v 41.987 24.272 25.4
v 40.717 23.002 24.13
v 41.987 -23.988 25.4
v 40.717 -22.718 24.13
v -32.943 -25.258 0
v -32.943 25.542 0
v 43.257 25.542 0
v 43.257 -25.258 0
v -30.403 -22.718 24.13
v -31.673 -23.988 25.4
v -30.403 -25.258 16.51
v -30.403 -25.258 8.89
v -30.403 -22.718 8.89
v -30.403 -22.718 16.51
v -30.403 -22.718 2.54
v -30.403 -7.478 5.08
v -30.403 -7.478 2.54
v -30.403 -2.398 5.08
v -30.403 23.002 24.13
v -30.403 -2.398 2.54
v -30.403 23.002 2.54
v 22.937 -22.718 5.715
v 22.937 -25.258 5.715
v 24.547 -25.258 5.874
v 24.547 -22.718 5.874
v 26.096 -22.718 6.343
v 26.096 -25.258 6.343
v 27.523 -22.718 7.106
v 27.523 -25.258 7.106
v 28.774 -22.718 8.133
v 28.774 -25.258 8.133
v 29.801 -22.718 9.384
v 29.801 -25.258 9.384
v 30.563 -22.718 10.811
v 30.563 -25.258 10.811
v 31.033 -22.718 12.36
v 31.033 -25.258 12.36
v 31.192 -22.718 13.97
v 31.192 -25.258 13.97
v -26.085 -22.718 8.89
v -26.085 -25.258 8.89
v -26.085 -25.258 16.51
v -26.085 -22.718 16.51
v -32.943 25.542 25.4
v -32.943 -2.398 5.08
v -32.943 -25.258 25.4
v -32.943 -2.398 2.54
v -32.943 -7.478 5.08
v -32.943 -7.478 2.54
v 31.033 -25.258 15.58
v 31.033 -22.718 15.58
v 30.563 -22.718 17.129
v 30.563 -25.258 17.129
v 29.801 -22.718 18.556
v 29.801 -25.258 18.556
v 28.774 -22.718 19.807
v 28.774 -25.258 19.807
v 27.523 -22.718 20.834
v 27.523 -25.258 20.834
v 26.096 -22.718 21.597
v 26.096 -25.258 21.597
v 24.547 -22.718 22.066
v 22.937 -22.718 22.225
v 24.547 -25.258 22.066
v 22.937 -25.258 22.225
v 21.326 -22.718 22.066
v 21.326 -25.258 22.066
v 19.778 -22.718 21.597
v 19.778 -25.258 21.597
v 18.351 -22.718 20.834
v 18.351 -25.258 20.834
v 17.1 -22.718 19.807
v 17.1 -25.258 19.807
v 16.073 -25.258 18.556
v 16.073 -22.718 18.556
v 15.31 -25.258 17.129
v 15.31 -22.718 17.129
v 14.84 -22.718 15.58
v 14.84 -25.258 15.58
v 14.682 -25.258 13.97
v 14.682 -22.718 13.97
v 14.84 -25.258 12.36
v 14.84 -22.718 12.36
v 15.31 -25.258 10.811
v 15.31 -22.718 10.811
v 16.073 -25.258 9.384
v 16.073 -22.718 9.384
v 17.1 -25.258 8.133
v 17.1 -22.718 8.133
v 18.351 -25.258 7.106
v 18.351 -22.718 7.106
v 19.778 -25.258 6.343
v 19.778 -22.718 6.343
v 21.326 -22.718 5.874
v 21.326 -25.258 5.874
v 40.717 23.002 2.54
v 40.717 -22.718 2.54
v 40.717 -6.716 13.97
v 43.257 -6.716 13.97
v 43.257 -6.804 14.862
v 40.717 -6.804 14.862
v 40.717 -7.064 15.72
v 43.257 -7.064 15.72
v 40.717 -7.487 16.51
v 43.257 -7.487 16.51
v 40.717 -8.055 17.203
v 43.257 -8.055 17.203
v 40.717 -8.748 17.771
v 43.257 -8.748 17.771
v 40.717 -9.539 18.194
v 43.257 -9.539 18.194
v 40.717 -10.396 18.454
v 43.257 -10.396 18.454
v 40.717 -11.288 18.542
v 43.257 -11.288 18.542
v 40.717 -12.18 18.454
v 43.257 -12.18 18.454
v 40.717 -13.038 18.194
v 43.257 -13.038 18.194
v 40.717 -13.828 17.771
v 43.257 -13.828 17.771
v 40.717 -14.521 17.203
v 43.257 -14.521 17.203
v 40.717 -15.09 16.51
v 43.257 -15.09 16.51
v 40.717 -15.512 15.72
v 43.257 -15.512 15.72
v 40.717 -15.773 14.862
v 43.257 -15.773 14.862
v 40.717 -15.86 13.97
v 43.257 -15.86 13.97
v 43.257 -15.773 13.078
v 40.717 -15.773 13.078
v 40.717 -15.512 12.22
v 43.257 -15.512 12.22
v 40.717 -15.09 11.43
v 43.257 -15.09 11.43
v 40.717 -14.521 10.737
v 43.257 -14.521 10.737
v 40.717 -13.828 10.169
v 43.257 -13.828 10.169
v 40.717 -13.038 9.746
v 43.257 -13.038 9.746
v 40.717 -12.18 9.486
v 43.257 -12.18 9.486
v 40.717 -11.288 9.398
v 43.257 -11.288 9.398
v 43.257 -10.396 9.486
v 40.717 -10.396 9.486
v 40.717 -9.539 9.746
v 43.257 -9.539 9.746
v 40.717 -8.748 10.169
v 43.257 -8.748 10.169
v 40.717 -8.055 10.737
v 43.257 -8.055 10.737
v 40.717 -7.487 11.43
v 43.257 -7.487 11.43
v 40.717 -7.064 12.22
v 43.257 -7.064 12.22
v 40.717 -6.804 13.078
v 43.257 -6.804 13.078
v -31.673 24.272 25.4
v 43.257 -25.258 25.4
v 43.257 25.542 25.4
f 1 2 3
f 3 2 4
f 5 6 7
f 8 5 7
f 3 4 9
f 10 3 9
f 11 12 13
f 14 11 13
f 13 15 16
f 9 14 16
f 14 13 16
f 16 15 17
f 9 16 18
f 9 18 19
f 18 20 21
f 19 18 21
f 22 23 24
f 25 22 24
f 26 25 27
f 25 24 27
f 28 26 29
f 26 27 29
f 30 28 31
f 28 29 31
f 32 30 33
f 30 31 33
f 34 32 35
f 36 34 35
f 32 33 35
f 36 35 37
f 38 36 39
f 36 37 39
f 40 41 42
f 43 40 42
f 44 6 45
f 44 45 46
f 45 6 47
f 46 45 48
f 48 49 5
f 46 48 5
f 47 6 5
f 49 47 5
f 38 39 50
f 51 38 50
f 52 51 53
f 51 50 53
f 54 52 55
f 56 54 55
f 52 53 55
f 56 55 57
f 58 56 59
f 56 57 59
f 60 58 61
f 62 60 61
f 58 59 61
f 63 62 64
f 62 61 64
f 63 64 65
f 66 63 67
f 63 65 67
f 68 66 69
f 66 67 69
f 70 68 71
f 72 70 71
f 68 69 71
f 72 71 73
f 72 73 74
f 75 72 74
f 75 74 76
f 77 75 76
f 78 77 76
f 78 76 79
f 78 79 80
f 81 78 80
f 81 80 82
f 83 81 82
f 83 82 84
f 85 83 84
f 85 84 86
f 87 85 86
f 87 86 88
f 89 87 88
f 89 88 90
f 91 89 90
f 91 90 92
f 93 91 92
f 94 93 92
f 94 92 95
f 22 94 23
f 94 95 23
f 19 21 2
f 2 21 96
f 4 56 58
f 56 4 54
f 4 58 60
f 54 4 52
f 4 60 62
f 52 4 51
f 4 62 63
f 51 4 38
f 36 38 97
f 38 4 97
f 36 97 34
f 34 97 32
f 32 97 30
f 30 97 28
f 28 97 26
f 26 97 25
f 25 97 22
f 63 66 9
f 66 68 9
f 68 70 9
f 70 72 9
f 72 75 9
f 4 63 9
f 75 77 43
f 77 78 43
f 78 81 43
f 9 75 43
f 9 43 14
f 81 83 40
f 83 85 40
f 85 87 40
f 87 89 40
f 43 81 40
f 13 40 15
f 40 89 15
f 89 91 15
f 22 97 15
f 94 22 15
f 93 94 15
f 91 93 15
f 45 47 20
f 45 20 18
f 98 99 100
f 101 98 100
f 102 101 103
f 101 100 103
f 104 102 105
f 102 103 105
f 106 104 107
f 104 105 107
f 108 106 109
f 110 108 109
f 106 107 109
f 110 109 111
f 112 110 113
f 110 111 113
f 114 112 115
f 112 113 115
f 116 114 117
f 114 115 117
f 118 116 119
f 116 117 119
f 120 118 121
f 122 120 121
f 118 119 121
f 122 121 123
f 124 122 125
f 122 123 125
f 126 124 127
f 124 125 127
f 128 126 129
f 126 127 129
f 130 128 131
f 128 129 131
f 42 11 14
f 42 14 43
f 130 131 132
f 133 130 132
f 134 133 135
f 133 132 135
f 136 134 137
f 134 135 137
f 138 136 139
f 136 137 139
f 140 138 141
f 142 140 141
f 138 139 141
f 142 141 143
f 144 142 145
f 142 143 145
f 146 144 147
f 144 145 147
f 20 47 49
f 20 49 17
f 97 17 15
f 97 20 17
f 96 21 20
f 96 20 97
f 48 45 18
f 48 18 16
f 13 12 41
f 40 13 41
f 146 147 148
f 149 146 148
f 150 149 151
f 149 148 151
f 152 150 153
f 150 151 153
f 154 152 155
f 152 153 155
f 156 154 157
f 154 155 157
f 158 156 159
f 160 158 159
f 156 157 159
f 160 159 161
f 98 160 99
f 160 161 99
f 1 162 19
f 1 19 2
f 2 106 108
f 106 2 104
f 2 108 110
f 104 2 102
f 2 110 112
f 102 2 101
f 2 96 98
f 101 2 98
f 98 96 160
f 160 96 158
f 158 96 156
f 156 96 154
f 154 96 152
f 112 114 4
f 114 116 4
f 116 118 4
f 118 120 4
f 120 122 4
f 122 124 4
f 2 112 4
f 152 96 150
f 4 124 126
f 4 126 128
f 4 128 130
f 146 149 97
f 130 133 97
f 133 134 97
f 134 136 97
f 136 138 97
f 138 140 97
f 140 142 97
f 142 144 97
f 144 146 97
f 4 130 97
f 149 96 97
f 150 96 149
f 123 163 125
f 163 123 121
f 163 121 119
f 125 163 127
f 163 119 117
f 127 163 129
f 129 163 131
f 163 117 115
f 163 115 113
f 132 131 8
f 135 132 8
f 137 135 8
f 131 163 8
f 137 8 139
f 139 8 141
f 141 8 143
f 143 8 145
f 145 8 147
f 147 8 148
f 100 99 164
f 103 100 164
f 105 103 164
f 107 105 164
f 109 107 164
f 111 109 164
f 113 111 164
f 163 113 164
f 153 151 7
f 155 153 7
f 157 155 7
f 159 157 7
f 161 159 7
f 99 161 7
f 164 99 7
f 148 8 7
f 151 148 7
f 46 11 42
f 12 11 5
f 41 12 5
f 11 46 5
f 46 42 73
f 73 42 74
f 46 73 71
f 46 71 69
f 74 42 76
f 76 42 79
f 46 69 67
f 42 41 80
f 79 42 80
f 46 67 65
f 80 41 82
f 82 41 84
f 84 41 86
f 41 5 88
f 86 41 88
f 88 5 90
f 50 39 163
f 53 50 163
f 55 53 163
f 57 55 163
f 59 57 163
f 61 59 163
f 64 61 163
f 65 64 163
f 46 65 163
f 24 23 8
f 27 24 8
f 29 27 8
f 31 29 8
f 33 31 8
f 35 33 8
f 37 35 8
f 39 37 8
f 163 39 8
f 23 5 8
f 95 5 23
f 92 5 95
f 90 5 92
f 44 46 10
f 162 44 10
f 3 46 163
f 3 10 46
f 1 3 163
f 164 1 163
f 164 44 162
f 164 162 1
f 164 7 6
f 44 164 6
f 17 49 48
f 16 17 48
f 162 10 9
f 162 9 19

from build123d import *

# Parameters (mm, degrees)
F0_W      = 76.2
F0_H      = 50.8
F1_DEPTH  = 2.54
F3_DEPTH  = 22.86
F5_DEPTH  = 25.4
F7_DEPTH  = 25.4
F8_W      = 4.318
F8_H      = 7.62
F9_DEPTH  = 25.4
F10_W     = 5.08
F10_H     = 2.54
F11_DEPTH = 25.4
F12_SIZE  = 1.27


with BuildPart() as f1:
    # F0 (on Top) → F1 (new body)
    with BuildSketch(Plane.XY):
        with Locations((5.156827, 0.141645)):
            Rectangle(F0_W, F0_H)
    extrude(amount=F1_DEPTH)

    # F2 (on face) → F3 (join)
    with BuildSketch(Plane.XY.offset(2.54)):
        Polygon((-30.403173, -22.718355), (-30.403173, 23.001645), (40.716827, 23.001645), (40.716827, -5.898658), (43.256827, -5.898658), (43.256827, 25.541645), (-32.943173, 25.541645), (-32.943173, -25.258355), (19.057203, -25.258355), (19.057203, -22.718355), align=None)
        Polygon((43.256827, -5.898658), (40.716827, -5.898658), (40.716827, -22.718355), (19.057203, -22.718355), (19.057203, -25.258355), (43.256827, -25.258355), align=None)
    extrude(amount=F3_DEPTH)

    # F4 (on face) → F5 (cut)
    with BuildSketch(Plane.XZ.offset(25.258355)):
        with BuildLine():
            Line((22.936827, 13.97), (31.191827, 13.97))
            ThreePointArc((31.191827, 13.97), (17.09966, 19.807166), (22.936827, 5.715))
            Line((22.936827, 5.715), (22.936827, 13.97))
        make_face()
        with BuildLine():
            ThreePointArc((22.936827, 5.715), (28.773993, 8.132834), (31.191827, 13.97))
            Line((31.191827, 13.97), (22.936827, 13.97))
            Line((22.936827, 13.97), (22.936827, 5.715))
        make_face()
    extrude(amount=-F5_DEPTH, mode=Mode.SUBTRACT)

    # F6 (on face) → F7 (cut)
    with BuildSketch(Plane.YZ.offset(43.256827)):
        with BuildLine():
            ThreePointArc((-11.288355, 9.398), (-8.055463, 10.737108), (-6.716355, 13.97))
            ThreePointArc((-6.716355, 13.97), (-11.288355, 18.542), (-15.860355, 13.97))
            Line((-15.860355, 13.97), (-11.288355, 13.97))
            Line((-11.288355, 13.97), (-11.288355, 9.398))
        make_face()
        with BuildLine():
            Line((-11.288355, 13.97), (-15.860355, 13.97))
            ThreePointArc((-15.860355, 13.97), (-14.521247, 10.737108), (-11.288355, 9.398))
            Line((-11.288355, 9.398), (-11.288355, 13.97))
        make_face()
    extrude(amount=-F7_DEPTH, mode=Mode.SUBTRACT)

    # F8 (on face) → F9 (cut)
    with BuildSketch(Plane.XZ.offset(25.258355)):
        with Locations((-28.244173, 12.7)):
            Rectangle(F8_W, F8_H)
    extrude(amount=-F9_DEPTH, mode=Mode.SUBTRACT)

    # F10 (on face) → F11 (cut)
    with BuildSketch(Plane(origin=(-32.943173, 0, 0), x_dir=(0, -1, 0), z_dir=(-1, 0, 0))):
        with Locations((4.938355, 3.81)):
            Rectangle(F10_W, F10_H)
    extrude(amount=-F11_DEPTH, mode=Mode.SUBTRACT)

    # F12
    f12_edges = [f1.edges().sort_by_distance(p)[0] for p in [
        (5.156827, 23.001645, 25.4),
        (-30.403173, 0.141645, 25.4),
        (40.716827, 0.141645, 25.4),
        (5.156827, -22.718355, 25.4),
    ]]
    chamfer(f12_edges, length=F12_SIZE)


solid = f1.part
